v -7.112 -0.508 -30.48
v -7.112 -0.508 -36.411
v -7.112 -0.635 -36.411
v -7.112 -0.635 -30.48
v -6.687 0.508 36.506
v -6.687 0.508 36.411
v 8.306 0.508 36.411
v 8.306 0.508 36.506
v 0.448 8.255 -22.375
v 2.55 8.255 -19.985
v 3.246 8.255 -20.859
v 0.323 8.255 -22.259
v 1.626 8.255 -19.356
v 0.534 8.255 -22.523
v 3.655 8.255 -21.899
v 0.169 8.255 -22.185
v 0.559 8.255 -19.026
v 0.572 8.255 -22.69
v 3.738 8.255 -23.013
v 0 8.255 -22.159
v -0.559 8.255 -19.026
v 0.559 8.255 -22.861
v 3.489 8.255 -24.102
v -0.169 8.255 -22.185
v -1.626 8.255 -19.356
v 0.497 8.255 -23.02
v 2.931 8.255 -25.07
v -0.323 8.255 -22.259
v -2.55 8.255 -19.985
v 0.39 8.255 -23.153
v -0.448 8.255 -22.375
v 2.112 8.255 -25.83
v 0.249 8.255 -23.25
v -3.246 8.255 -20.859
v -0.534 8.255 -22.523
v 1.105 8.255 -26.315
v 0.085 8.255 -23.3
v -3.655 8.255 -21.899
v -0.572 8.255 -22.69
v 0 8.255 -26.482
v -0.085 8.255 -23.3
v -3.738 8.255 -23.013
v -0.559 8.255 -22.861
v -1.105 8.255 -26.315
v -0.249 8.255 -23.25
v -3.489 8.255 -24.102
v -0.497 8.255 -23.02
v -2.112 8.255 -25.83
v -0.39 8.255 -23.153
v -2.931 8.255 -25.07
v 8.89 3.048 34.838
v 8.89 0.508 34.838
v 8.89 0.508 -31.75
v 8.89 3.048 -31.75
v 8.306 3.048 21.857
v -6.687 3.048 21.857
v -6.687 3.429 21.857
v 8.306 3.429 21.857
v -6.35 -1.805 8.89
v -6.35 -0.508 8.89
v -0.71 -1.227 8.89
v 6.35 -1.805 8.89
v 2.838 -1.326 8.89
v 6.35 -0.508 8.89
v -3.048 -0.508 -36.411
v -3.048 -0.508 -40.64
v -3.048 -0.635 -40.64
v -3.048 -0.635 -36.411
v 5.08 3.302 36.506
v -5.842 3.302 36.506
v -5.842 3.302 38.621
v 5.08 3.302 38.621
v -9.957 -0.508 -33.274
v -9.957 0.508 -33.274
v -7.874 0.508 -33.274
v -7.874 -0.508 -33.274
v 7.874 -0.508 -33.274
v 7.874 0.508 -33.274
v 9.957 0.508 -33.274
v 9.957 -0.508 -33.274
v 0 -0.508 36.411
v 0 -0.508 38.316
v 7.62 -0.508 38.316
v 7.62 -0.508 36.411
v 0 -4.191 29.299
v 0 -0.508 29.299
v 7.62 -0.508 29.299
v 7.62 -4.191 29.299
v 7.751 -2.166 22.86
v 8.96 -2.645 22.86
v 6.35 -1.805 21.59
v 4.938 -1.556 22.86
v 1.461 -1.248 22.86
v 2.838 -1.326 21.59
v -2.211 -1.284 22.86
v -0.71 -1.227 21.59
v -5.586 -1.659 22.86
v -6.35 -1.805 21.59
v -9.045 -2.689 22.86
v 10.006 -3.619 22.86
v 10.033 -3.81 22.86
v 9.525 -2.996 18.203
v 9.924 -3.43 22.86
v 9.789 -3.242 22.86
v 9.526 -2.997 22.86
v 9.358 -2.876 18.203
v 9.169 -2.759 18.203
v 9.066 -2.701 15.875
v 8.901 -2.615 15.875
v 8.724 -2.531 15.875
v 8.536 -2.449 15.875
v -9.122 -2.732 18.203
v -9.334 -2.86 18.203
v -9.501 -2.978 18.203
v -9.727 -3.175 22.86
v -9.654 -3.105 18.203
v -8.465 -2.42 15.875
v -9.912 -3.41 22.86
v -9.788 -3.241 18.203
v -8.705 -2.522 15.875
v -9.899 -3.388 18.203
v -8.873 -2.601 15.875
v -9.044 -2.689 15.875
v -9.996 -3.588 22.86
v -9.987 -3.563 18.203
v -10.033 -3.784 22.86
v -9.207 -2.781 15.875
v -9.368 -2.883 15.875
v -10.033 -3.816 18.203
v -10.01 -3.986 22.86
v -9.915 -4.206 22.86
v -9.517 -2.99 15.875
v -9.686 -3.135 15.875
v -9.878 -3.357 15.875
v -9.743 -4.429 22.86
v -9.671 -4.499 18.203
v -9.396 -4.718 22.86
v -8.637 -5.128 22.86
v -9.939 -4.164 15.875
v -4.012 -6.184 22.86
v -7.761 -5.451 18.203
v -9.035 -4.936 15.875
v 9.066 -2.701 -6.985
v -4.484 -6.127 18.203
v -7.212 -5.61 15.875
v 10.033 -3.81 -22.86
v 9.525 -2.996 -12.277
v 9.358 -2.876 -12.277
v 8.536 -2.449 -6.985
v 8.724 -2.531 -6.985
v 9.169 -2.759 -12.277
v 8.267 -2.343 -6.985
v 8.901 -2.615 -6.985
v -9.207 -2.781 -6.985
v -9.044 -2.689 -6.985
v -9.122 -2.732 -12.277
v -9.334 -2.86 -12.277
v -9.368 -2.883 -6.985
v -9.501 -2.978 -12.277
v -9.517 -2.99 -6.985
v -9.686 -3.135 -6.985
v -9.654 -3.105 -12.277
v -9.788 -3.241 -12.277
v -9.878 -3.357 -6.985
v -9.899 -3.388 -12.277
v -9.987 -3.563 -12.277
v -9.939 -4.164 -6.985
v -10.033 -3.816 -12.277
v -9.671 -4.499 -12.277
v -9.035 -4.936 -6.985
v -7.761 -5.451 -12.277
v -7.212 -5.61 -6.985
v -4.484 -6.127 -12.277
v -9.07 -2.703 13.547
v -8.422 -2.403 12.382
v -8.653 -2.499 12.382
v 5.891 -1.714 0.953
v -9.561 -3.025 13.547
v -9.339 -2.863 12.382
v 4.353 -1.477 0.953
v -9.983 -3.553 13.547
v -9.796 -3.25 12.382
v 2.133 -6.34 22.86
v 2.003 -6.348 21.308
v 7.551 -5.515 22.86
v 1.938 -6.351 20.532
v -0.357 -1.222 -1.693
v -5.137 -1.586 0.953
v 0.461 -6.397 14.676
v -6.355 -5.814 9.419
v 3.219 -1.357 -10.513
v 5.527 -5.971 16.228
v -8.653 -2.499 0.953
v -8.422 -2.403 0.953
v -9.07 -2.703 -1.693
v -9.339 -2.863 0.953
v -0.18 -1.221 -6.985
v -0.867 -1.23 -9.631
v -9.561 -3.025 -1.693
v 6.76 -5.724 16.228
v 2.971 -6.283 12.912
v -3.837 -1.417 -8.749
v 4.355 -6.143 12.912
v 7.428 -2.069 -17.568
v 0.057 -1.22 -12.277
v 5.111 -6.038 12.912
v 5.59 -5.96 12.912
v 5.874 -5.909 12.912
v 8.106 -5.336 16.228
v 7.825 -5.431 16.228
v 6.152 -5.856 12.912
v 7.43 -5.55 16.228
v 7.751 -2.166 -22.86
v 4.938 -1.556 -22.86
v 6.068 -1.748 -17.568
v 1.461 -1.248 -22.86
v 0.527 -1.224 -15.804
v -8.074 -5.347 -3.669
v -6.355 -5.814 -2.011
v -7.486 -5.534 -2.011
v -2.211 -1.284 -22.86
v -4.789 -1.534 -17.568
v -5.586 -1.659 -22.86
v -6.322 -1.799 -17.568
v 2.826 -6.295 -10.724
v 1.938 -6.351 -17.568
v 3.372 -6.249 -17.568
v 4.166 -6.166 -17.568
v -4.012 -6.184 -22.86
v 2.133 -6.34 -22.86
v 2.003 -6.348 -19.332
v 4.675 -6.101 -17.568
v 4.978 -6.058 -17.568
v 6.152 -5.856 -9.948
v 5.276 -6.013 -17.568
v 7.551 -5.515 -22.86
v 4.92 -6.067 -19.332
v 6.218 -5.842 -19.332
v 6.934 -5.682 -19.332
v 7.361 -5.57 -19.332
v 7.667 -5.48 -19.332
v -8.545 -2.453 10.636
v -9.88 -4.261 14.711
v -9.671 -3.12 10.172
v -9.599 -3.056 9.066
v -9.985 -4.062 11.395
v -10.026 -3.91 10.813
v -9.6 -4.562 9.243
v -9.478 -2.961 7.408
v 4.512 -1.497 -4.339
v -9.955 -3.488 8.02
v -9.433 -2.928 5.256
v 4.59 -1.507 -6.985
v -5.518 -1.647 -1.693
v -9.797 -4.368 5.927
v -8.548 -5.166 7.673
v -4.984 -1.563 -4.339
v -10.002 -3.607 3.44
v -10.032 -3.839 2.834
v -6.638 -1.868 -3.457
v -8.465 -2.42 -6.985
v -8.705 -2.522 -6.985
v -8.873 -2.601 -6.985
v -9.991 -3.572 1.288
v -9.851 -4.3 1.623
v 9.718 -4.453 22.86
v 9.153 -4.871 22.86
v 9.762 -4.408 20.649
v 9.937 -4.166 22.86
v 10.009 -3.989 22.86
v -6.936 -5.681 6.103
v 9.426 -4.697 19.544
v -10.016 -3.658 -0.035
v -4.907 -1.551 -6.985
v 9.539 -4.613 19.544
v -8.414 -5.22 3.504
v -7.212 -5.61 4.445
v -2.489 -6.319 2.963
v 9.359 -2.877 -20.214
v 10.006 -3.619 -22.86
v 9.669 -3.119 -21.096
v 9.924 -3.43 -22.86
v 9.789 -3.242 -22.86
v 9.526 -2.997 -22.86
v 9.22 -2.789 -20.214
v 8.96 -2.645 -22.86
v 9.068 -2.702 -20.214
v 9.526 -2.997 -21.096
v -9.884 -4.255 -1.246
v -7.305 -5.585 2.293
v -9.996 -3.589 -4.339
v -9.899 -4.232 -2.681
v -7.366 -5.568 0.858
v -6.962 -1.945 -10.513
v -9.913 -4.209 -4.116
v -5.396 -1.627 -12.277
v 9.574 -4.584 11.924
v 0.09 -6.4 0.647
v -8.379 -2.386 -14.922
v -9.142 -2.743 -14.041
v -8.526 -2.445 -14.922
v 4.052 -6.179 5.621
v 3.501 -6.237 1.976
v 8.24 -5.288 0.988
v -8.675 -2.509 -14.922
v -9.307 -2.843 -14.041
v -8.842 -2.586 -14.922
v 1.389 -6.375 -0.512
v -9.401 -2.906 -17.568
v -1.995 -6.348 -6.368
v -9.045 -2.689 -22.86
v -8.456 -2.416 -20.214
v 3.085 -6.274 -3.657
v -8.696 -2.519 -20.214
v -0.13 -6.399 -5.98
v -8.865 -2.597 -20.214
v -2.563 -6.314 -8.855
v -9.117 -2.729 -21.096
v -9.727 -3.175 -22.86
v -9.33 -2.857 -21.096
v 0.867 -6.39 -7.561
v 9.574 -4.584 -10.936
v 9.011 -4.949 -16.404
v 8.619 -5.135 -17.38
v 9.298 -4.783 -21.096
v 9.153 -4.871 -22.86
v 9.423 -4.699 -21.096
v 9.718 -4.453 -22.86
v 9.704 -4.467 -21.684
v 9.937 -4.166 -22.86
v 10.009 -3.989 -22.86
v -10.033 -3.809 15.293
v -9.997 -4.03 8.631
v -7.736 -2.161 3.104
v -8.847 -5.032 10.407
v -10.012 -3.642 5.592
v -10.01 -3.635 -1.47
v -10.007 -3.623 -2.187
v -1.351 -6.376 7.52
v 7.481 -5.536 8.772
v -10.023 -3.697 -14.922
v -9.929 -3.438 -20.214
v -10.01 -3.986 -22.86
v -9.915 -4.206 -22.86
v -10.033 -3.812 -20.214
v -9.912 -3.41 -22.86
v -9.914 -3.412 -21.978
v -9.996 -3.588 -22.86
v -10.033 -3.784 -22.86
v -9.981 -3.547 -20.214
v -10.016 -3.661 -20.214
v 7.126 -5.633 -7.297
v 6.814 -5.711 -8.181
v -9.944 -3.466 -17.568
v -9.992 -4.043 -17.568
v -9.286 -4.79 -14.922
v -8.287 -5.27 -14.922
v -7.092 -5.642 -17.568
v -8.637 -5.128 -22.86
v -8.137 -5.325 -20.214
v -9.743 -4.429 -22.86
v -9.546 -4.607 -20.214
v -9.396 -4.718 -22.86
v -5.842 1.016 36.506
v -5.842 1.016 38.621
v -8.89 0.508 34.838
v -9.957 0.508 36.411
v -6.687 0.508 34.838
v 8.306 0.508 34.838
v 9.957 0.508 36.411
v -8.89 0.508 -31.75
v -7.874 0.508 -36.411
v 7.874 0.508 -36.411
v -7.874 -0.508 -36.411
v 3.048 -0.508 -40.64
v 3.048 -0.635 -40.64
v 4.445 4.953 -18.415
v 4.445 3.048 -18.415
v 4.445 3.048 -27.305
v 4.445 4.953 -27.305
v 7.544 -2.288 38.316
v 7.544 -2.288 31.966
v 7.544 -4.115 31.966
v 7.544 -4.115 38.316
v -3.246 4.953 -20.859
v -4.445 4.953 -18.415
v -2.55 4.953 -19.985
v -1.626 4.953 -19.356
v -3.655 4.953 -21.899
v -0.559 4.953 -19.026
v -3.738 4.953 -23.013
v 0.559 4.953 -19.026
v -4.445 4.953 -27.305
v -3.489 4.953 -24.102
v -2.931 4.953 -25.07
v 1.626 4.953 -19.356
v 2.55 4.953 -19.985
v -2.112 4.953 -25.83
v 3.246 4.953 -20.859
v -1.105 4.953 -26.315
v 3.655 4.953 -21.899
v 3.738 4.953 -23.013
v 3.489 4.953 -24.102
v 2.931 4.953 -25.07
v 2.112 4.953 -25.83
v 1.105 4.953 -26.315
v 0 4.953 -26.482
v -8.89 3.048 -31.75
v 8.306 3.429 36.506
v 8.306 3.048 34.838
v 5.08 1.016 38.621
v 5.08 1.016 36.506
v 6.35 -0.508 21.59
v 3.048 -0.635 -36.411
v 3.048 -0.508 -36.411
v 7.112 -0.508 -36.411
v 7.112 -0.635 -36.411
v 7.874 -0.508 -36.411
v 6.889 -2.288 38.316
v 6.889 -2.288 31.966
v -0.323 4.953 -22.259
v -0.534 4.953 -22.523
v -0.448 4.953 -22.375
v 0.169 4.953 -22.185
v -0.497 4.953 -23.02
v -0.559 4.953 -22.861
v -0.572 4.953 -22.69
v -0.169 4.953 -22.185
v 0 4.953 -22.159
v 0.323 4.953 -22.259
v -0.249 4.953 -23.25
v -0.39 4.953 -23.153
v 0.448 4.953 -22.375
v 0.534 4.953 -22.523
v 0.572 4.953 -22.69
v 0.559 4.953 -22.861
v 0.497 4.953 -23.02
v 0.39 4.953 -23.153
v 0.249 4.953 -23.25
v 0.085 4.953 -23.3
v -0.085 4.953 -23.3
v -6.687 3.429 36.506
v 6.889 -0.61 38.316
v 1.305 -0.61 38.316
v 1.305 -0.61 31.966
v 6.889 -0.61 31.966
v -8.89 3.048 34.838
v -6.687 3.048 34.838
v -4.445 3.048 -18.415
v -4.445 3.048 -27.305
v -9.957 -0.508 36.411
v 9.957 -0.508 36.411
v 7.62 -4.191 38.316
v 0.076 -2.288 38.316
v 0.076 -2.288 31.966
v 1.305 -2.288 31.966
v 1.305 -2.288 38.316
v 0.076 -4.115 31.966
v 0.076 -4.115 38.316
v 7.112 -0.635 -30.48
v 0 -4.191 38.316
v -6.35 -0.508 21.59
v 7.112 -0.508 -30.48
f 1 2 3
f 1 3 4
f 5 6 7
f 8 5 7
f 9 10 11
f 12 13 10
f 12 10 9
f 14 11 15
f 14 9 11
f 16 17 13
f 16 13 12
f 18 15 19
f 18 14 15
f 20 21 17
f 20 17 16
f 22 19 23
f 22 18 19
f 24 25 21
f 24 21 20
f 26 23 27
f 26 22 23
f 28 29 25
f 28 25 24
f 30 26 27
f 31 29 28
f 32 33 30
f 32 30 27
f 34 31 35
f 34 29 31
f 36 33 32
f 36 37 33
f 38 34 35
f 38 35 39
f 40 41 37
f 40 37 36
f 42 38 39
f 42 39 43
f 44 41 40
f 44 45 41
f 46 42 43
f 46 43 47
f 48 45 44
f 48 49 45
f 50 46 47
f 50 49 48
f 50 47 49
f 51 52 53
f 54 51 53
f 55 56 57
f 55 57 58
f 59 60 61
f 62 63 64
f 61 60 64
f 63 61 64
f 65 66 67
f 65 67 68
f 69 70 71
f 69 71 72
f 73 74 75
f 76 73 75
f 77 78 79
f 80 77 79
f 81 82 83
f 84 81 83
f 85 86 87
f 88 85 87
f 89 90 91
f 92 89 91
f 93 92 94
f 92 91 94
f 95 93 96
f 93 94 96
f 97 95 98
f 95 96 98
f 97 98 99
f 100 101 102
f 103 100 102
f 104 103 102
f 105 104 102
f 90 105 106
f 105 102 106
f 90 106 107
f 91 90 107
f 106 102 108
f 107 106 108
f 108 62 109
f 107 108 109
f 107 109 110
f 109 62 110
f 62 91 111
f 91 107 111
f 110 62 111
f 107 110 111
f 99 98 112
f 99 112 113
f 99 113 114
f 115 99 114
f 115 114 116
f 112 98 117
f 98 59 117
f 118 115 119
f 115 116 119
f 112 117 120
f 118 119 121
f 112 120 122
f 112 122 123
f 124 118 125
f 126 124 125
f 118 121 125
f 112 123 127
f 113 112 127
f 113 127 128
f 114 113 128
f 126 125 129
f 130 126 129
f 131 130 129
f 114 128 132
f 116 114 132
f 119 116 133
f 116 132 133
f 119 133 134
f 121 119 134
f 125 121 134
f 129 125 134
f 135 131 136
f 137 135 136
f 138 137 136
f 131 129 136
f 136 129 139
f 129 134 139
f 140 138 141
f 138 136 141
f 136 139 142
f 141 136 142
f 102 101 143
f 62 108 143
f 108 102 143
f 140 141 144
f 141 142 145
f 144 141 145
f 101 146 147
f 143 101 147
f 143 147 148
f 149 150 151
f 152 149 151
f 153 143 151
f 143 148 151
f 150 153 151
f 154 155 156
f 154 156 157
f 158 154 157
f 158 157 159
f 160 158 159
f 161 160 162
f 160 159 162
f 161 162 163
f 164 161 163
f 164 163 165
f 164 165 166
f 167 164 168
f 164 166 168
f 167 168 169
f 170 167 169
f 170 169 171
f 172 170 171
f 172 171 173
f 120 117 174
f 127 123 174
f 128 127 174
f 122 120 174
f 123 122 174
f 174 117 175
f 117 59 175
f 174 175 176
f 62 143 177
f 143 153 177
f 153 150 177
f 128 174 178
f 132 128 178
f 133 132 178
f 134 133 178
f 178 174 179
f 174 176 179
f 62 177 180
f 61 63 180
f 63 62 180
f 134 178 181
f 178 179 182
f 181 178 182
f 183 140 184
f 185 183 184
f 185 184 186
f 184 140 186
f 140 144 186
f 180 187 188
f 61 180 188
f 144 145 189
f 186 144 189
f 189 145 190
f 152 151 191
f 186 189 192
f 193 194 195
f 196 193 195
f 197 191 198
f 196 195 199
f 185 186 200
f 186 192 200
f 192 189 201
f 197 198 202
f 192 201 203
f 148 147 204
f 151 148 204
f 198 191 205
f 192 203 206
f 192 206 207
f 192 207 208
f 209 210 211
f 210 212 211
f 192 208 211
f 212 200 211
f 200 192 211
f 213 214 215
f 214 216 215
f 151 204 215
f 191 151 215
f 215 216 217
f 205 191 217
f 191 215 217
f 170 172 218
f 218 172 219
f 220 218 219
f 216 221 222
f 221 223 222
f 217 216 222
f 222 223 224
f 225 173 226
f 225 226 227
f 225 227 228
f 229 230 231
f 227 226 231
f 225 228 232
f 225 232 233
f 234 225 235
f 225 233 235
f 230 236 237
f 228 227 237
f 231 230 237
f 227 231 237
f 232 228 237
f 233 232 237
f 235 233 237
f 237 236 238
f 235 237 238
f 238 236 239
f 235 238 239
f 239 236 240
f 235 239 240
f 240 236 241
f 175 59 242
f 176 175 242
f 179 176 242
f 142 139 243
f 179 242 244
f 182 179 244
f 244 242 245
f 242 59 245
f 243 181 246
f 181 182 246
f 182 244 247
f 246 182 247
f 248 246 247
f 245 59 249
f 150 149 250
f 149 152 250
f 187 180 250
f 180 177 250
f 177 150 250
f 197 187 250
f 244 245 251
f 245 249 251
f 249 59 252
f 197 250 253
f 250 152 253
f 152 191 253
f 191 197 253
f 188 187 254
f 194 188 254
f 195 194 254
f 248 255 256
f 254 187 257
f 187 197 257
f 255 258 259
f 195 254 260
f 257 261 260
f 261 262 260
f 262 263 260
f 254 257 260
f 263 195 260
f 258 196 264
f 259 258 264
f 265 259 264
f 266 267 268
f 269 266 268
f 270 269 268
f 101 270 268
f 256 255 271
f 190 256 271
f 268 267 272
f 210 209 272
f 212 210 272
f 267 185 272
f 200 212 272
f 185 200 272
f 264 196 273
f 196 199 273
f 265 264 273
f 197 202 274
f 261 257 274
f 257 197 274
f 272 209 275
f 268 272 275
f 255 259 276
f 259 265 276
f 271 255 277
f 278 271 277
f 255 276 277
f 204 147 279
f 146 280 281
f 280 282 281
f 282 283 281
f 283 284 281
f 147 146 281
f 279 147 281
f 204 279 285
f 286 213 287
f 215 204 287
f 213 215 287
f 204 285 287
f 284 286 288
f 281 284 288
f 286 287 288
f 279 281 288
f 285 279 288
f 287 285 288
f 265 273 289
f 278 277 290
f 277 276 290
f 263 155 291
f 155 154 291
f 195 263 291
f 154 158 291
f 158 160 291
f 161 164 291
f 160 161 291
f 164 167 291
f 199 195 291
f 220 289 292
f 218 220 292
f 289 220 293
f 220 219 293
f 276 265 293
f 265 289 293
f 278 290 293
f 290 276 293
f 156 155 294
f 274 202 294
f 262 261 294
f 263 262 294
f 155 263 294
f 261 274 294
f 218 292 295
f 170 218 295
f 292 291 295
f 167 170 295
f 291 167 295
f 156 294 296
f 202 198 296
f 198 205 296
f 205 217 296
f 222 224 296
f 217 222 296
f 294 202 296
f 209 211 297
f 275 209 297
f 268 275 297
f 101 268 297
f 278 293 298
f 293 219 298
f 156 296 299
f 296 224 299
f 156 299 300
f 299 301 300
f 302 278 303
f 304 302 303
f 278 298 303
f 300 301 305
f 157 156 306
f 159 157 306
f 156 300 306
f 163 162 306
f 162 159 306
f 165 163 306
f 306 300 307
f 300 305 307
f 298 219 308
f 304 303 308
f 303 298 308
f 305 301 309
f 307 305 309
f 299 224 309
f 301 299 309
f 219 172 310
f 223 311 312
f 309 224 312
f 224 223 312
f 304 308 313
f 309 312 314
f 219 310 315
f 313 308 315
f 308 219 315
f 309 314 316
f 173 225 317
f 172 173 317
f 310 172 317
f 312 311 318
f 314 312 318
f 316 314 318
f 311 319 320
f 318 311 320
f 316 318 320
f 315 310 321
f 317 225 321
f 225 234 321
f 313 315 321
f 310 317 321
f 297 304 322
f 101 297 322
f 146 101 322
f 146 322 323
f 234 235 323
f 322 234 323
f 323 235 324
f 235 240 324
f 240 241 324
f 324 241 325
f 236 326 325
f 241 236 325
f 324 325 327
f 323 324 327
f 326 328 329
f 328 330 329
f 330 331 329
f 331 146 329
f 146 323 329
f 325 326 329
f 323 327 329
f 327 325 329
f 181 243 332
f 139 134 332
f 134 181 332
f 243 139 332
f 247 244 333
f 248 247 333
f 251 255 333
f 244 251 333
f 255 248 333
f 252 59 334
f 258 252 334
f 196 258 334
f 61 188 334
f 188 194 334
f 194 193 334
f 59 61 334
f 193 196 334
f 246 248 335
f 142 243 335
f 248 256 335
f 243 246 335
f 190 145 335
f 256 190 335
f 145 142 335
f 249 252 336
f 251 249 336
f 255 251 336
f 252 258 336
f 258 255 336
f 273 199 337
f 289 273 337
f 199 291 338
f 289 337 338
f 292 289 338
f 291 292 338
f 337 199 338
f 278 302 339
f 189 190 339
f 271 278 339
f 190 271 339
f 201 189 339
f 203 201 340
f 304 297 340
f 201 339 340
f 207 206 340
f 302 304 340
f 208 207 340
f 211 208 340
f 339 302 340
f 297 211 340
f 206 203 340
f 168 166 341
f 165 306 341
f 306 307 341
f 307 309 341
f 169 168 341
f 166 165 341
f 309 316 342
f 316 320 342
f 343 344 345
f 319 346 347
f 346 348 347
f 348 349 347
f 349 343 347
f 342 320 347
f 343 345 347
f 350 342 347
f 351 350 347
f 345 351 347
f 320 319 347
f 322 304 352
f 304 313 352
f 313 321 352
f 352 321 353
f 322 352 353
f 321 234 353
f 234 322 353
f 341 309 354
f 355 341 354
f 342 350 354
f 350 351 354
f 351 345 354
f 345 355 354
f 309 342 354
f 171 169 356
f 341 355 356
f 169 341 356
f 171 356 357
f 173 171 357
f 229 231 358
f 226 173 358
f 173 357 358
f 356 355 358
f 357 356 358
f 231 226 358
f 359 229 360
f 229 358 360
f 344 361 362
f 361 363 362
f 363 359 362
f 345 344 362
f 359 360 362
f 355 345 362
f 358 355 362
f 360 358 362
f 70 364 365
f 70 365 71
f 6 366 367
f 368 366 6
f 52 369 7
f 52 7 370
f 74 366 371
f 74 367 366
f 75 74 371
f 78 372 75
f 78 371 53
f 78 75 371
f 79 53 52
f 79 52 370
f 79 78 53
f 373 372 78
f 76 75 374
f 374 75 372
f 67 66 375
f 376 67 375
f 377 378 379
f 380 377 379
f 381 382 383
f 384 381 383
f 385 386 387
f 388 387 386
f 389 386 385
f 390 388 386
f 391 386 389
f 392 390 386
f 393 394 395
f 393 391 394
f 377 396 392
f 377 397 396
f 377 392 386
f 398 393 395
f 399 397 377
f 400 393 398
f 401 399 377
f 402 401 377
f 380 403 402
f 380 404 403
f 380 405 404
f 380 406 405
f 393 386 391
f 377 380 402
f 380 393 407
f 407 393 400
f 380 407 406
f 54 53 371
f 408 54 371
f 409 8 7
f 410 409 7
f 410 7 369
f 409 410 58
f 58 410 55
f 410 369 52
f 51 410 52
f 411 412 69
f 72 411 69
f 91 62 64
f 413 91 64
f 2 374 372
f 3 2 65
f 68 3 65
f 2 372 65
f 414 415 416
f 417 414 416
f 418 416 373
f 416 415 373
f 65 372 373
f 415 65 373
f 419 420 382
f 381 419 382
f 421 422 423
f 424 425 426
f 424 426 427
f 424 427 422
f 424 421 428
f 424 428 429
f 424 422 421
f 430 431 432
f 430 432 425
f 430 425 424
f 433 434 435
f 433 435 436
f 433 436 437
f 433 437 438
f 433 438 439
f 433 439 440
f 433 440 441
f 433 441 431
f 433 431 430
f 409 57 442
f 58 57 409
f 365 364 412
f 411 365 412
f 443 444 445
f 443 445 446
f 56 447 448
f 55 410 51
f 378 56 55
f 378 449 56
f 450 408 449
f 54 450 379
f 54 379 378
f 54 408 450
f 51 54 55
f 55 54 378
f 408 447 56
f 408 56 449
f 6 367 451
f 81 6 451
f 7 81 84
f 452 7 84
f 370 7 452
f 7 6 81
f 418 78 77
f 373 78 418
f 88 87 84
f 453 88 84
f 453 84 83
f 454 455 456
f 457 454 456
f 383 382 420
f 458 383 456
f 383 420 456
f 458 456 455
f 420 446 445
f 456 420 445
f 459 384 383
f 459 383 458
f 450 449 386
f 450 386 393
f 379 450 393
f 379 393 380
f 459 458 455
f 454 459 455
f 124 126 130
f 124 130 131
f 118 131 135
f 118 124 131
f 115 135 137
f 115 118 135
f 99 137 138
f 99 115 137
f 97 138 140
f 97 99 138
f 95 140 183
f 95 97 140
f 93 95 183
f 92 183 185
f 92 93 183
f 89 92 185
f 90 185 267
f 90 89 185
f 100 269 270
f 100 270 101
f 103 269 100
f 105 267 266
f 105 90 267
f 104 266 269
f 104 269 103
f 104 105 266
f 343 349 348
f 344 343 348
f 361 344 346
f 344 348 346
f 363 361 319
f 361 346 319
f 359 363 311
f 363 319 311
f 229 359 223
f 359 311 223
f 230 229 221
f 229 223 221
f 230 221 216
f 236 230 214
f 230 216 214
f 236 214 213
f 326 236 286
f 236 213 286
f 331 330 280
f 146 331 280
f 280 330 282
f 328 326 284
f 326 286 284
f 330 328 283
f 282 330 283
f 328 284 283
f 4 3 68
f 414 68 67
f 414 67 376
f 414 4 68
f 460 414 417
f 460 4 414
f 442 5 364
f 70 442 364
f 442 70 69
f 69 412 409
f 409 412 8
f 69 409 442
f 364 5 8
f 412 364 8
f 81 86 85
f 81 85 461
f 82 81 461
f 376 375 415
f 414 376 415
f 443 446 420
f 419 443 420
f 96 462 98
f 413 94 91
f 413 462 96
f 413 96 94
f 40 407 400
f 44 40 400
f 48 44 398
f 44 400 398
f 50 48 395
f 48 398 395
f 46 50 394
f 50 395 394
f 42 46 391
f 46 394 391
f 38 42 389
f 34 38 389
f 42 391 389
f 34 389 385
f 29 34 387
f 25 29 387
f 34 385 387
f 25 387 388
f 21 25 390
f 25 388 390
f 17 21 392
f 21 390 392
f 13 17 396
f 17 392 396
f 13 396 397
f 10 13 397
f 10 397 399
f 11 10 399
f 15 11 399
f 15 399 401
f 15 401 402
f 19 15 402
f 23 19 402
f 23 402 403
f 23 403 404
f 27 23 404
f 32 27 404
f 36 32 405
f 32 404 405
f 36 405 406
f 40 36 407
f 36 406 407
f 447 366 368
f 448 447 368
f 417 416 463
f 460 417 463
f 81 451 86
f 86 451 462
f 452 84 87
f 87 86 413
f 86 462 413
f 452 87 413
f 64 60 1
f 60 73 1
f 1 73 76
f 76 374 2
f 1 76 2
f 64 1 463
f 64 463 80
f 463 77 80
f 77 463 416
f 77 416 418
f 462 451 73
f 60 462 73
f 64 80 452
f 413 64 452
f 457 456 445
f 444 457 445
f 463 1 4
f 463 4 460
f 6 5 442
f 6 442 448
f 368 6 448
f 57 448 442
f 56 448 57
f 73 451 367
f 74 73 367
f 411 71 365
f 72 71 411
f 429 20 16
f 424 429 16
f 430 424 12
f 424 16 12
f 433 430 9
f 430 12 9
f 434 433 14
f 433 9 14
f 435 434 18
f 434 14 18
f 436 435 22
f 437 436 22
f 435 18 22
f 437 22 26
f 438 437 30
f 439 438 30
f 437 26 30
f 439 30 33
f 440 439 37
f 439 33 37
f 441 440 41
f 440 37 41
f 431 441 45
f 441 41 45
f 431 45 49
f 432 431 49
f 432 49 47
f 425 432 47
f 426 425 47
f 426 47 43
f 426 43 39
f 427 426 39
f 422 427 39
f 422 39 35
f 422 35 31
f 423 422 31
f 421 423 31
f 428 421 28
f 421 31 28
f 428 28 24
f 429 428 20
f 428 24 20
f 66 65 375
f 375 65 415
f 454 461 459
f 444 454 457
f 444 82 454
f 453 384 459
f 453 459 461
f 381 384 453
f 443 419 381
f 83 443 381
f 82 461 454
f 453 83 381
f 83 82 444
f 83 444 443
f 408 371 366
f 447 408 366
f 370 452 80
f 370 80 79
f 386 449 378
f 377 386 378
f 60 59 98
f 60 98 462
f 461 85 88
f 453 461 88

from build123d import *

# Parameters (mm, degrees)
BOSS_EXTRUDE2_DEPTH      = 6.35
BOSS_EXTRUDE2_DEPTH_BACK = 6.35
BOSS_EXTRUDE2_START      = 15.24
SKETCH4_W                = 12.7
SKETCH4_H                = 1.397
BOSS_EXTRUDE3_DEPTH      = 22.86
BOSS_EXTRUDE3_DEPTH_BACK = 22.86
SKETCH5_RX               = 10.033
SKETCH5_RY               = 2.589631332
BOSS_EXTRUDE4_DEPTH      = 36.4109
BOSS_EXTRUDE4_DEPTH_BACK = 36.4109
SKETCH6_W                = 19.9136
SKETCH6_H                = 1.016
SKETCH7_W                = 14.992697908
SKETCH7_H                = 14.648957972
BOSS_EXTRUDE6_DEPTH      = 2.921
SKETCH10_W               = 10.922
SKETCH10_H               = 2.286
BOSS_EXTRUDE7_DEPTH      = 2.115042028
CUT_EXTRUDE1_REACH       = 42.496
SKETCH11_W               = 2.0828
SKETCH11_H               = 3.1369
SKETCH12_W               = 7.62
SKETCH12_H               = 9.017
BOSS_EXTRUDE8_DEPTH      = 3.683
SKETCH13_W               = 8.89
SKETCH13_H               = 8.89
BOSS_EXTRUDE9_DEPTH      = 4.445
SKETCH14_R               = 3.748513876
BOSS_EXTRUDE10_DEPTH     = 3.302
SKETCH15_R               = 0.573513876
CUT_EXTRUDE2_DEPTH       = 3.302
SKETCH16_W               = 14.224
SKETCH16_H               = 5.9309
SKETCH16_W_2             = 6.096
SKETCH16_H_2             = 4.2291
BOSS_EXTRUDE11_DEPTH     = 0.127
CUT_EXTRUDE3_DEPTH       = 6.35
SKETCH18_W               = 8.89
SKETCH18_H               = 8.89
BOSS_EXTRUDE13_DEPTH     = 2.54


with BuildPart() as part:
    # Sketch4 → Boss-Extrude2 (new, two sides: drawn at the far end of the back side and taken through both)
    with BuildSketch(Plane.XY.offset(BOSS_EXTRUDE2_START - BOSS_EXTRUDE2_DEPTH_BACK)):
        with Locations((0, -1.2065)):
            Rectangle(SKETCH4_W, SKETCH4_H)
    extrude(amount=BOSS_EXTRUDE2_DEPTH + BOSS_EXTRUDE2_DEPTH_BACK)

    # Sketch5 → Boss-Extrude3 (add, two sides: drawn at the far end of the back side and taken through both)
    with BuildSketch(Plane.XY.offset(-BOSS_EXTRUDE3_DEPTH_BACK)):
        with Locations((0, -3.81)):
            Ellipse(SKETCH5_RX, SKETCH5_RY)
    extrude(amount=BOSS_EXTRUDE3_DEPTH + BOSS_EXTRUDE3_DEPTH_BACK)

    # Sketch6 → Boss-Extrude4 (add, two sides: drawn at the far end of the back side and taken through both)
    with BuildSketch(Plane.XY.offset(-BOSS_EXTRUDE4_DEPTH_BACK)):
        Rectangle(SKETCH6_W, SKETCH6_H)
    extrude(amount=BOSS_EXTRUDE4_DEPTH + BOSS_EXTRUDE4_DEPTH_BACK)

    # Sketch7 → Boss-Extrude6 (add)
    with BuildSketch(Plane(origin=(0, 0.508, 0), x_dir=(1, 0, 0), z_dir=(0, 1, 0))):
        with Locations((0.809451046, -29.181178986)):
            Rectangle(SKETCH7_W, SKETCH7_H)
    extrude(amount=BOSS_EXTRUDE6_DEPTH)

    # Sketch10 → Boss-Extrude7 (add)
    with BuildSketch(Plane.XY.offset(36.505657972)):
        with Locations((-0.381, 2.159)):
            Rectangle(SKETCH10_W, SKETCH10_H)
    extrude(amount=BOSS_EXTRUDE7_DEPTH)

    # Sketch11 → Cut-Extrude1 (cut, up to next)
    with BuildSketch(Plane(origin=(0, 0.508, 0), x_dir=(1, 0, 0), z_dir=(0, 1, 0)), mode=Mode.PRIVATE) as cut_extrude1_sk1:
        with Locations((-8.9154, 34.84245)):
            Rectangle(SKETCH11_W, SKETCH11_H)
    cut_extrude1_tool1 = extrude(cut_extrude1_sk1.sketch, amount=-CUT_EXTRUDE1_REACH, mode=Mode.PRIVATE) & part.part
    # Sketch11 → Cut-Extrude1 (cut, up to next)
    with BuildSketch(Plane(origin=(0, 0.508, 0), x_dir=(1, 0, 0), z_dir=(0, 1, 0)), mode=Mode.PRIVATE) as cut_extrude1_sk2:
        with Locations((8.9154, 34.84245)):
            Rectangle(SKETCH11_W, SKETCH11_H)
    cut_extrude1_tool2 = extrude(cut_extrude1_sk2.sketch, amount=-CUT_EXTRUDE1_REACH, mode=Mode.PRIVATE) & part.part
    add(cut_extrude1_tool1.solids().sort_by_distance((-8.9154, 0.508, -34.84245))[0], mode=Mode.SUBTRACT)
    add(cut_extrude1_tool2.solids().sort_by_distance((8.9154, 0.508, -34.84245))[0], mode=Mode.SUBTRACT)

    # Sketch12 → Boss-Extrude8 (add)
    with BuildSketch(Plane.XZ.offset(0.508)):
        with Locations((3.81, 33.8074)):
            Rectangle(SKETCH12_W, SKETCH12_H)
    extrude(amount=BOSS_EXTRUDE8_DEPTH)

    # Sketch13 → Boss-Extrude9 (add)
    with BuildSketch(Plane(origin=(0, 0.508, 0), x_dir=(1, 0, 0), z_dir=(0, 1, 0))):
        with Locations((0, 22.86)):
            Rectangle(SKETCH13_W, SKETCH13_H)
    extrude(amount=BOSS_EXTRUDE9_DEPTH)

    # Sketch14 → Boss-Extrude10 (add)
    with BuildSketch(Plane(origin=(0, 4.953, 0), x_dir=(1, 0, 0), z_dir=(0, 1, 0))):
        with Locations(Location((0, 22.733, 0), (0, 0, 90))):
            Circle(SKETCH14_R)
    extrude(amount=BOSS_EXTRUDE10_DEPTH)

    # Sketch15 → Cut-Extrude2 (cut)
    with BuildSketch(Plane(origin=(0, 8.255, 0), x_dir=(1, 0, 0), z_dir=(0, 1, 0))):
        with Locations(Location((0, 22.733, 0), (0, 0, 270))):
            Circle(SKETCH15_R)
    extrude(amount=-CUT_EXTRUDE2_DEPTH, mode=Mode.SUBTRACT)

    # Sketch16 → Boss-Extrude11 (add)
    with BuildSketch(Plane.XZ.offset(0.508)):
        with Locations((0, -33.44545)):
            Rectangle(SKETCH16_W, SKETCH16_H)
        with Locations((0, -38.52545)):
            Rectangle(SKETCH16_W_2, SKETCH16_H_2)
    extrude(amount=BOSS_EXTRUDE11_DEPTH)

    # Sketch17 → Cut-Extrude3 (cut)
    with BuildSketch(Plane.XY.offset(38.3159)):
        Polygon((1.305274753, -0.6096), (6.889189319, -0.6096), (6.889189319, -2.287768833), (7.5438, -2.287768833), (7.5438, -4.1148), (0.0762, -4.1148), (0.0762, -2.287768833), (1.305274753, -2.287768833), align=None)
    extrude(amount=-CUT_EXTRUDE3_DEPTH, mode=Mode.SUBTRACT)

    # Sketch18 → Boss-Extrude13 (add)
    with BuildSketch(Plane(origin=(0, 0.508, 0), x_dir=(1, 0, 0), z_dir=(0, 1, 0))):
        Polygon((8.3058, -34.838229956), (8.89, -34.838229956), (8.89, 31.75), (-8.89, 31.75), (-8.89, -34.838229956), (-6.686897908, -34.838229956), (-6.686897908, -21.8567), (8.3058, -21.8567), align=None)
        with Locations((0, 22.86)):
            Rectangle(SKETCH18_W, SKETCH18_H, mode=Mode.SUBTRACT)
    extrude(amount=BOSS_EXTRUDE13_DEPTH)


solid = part.part
